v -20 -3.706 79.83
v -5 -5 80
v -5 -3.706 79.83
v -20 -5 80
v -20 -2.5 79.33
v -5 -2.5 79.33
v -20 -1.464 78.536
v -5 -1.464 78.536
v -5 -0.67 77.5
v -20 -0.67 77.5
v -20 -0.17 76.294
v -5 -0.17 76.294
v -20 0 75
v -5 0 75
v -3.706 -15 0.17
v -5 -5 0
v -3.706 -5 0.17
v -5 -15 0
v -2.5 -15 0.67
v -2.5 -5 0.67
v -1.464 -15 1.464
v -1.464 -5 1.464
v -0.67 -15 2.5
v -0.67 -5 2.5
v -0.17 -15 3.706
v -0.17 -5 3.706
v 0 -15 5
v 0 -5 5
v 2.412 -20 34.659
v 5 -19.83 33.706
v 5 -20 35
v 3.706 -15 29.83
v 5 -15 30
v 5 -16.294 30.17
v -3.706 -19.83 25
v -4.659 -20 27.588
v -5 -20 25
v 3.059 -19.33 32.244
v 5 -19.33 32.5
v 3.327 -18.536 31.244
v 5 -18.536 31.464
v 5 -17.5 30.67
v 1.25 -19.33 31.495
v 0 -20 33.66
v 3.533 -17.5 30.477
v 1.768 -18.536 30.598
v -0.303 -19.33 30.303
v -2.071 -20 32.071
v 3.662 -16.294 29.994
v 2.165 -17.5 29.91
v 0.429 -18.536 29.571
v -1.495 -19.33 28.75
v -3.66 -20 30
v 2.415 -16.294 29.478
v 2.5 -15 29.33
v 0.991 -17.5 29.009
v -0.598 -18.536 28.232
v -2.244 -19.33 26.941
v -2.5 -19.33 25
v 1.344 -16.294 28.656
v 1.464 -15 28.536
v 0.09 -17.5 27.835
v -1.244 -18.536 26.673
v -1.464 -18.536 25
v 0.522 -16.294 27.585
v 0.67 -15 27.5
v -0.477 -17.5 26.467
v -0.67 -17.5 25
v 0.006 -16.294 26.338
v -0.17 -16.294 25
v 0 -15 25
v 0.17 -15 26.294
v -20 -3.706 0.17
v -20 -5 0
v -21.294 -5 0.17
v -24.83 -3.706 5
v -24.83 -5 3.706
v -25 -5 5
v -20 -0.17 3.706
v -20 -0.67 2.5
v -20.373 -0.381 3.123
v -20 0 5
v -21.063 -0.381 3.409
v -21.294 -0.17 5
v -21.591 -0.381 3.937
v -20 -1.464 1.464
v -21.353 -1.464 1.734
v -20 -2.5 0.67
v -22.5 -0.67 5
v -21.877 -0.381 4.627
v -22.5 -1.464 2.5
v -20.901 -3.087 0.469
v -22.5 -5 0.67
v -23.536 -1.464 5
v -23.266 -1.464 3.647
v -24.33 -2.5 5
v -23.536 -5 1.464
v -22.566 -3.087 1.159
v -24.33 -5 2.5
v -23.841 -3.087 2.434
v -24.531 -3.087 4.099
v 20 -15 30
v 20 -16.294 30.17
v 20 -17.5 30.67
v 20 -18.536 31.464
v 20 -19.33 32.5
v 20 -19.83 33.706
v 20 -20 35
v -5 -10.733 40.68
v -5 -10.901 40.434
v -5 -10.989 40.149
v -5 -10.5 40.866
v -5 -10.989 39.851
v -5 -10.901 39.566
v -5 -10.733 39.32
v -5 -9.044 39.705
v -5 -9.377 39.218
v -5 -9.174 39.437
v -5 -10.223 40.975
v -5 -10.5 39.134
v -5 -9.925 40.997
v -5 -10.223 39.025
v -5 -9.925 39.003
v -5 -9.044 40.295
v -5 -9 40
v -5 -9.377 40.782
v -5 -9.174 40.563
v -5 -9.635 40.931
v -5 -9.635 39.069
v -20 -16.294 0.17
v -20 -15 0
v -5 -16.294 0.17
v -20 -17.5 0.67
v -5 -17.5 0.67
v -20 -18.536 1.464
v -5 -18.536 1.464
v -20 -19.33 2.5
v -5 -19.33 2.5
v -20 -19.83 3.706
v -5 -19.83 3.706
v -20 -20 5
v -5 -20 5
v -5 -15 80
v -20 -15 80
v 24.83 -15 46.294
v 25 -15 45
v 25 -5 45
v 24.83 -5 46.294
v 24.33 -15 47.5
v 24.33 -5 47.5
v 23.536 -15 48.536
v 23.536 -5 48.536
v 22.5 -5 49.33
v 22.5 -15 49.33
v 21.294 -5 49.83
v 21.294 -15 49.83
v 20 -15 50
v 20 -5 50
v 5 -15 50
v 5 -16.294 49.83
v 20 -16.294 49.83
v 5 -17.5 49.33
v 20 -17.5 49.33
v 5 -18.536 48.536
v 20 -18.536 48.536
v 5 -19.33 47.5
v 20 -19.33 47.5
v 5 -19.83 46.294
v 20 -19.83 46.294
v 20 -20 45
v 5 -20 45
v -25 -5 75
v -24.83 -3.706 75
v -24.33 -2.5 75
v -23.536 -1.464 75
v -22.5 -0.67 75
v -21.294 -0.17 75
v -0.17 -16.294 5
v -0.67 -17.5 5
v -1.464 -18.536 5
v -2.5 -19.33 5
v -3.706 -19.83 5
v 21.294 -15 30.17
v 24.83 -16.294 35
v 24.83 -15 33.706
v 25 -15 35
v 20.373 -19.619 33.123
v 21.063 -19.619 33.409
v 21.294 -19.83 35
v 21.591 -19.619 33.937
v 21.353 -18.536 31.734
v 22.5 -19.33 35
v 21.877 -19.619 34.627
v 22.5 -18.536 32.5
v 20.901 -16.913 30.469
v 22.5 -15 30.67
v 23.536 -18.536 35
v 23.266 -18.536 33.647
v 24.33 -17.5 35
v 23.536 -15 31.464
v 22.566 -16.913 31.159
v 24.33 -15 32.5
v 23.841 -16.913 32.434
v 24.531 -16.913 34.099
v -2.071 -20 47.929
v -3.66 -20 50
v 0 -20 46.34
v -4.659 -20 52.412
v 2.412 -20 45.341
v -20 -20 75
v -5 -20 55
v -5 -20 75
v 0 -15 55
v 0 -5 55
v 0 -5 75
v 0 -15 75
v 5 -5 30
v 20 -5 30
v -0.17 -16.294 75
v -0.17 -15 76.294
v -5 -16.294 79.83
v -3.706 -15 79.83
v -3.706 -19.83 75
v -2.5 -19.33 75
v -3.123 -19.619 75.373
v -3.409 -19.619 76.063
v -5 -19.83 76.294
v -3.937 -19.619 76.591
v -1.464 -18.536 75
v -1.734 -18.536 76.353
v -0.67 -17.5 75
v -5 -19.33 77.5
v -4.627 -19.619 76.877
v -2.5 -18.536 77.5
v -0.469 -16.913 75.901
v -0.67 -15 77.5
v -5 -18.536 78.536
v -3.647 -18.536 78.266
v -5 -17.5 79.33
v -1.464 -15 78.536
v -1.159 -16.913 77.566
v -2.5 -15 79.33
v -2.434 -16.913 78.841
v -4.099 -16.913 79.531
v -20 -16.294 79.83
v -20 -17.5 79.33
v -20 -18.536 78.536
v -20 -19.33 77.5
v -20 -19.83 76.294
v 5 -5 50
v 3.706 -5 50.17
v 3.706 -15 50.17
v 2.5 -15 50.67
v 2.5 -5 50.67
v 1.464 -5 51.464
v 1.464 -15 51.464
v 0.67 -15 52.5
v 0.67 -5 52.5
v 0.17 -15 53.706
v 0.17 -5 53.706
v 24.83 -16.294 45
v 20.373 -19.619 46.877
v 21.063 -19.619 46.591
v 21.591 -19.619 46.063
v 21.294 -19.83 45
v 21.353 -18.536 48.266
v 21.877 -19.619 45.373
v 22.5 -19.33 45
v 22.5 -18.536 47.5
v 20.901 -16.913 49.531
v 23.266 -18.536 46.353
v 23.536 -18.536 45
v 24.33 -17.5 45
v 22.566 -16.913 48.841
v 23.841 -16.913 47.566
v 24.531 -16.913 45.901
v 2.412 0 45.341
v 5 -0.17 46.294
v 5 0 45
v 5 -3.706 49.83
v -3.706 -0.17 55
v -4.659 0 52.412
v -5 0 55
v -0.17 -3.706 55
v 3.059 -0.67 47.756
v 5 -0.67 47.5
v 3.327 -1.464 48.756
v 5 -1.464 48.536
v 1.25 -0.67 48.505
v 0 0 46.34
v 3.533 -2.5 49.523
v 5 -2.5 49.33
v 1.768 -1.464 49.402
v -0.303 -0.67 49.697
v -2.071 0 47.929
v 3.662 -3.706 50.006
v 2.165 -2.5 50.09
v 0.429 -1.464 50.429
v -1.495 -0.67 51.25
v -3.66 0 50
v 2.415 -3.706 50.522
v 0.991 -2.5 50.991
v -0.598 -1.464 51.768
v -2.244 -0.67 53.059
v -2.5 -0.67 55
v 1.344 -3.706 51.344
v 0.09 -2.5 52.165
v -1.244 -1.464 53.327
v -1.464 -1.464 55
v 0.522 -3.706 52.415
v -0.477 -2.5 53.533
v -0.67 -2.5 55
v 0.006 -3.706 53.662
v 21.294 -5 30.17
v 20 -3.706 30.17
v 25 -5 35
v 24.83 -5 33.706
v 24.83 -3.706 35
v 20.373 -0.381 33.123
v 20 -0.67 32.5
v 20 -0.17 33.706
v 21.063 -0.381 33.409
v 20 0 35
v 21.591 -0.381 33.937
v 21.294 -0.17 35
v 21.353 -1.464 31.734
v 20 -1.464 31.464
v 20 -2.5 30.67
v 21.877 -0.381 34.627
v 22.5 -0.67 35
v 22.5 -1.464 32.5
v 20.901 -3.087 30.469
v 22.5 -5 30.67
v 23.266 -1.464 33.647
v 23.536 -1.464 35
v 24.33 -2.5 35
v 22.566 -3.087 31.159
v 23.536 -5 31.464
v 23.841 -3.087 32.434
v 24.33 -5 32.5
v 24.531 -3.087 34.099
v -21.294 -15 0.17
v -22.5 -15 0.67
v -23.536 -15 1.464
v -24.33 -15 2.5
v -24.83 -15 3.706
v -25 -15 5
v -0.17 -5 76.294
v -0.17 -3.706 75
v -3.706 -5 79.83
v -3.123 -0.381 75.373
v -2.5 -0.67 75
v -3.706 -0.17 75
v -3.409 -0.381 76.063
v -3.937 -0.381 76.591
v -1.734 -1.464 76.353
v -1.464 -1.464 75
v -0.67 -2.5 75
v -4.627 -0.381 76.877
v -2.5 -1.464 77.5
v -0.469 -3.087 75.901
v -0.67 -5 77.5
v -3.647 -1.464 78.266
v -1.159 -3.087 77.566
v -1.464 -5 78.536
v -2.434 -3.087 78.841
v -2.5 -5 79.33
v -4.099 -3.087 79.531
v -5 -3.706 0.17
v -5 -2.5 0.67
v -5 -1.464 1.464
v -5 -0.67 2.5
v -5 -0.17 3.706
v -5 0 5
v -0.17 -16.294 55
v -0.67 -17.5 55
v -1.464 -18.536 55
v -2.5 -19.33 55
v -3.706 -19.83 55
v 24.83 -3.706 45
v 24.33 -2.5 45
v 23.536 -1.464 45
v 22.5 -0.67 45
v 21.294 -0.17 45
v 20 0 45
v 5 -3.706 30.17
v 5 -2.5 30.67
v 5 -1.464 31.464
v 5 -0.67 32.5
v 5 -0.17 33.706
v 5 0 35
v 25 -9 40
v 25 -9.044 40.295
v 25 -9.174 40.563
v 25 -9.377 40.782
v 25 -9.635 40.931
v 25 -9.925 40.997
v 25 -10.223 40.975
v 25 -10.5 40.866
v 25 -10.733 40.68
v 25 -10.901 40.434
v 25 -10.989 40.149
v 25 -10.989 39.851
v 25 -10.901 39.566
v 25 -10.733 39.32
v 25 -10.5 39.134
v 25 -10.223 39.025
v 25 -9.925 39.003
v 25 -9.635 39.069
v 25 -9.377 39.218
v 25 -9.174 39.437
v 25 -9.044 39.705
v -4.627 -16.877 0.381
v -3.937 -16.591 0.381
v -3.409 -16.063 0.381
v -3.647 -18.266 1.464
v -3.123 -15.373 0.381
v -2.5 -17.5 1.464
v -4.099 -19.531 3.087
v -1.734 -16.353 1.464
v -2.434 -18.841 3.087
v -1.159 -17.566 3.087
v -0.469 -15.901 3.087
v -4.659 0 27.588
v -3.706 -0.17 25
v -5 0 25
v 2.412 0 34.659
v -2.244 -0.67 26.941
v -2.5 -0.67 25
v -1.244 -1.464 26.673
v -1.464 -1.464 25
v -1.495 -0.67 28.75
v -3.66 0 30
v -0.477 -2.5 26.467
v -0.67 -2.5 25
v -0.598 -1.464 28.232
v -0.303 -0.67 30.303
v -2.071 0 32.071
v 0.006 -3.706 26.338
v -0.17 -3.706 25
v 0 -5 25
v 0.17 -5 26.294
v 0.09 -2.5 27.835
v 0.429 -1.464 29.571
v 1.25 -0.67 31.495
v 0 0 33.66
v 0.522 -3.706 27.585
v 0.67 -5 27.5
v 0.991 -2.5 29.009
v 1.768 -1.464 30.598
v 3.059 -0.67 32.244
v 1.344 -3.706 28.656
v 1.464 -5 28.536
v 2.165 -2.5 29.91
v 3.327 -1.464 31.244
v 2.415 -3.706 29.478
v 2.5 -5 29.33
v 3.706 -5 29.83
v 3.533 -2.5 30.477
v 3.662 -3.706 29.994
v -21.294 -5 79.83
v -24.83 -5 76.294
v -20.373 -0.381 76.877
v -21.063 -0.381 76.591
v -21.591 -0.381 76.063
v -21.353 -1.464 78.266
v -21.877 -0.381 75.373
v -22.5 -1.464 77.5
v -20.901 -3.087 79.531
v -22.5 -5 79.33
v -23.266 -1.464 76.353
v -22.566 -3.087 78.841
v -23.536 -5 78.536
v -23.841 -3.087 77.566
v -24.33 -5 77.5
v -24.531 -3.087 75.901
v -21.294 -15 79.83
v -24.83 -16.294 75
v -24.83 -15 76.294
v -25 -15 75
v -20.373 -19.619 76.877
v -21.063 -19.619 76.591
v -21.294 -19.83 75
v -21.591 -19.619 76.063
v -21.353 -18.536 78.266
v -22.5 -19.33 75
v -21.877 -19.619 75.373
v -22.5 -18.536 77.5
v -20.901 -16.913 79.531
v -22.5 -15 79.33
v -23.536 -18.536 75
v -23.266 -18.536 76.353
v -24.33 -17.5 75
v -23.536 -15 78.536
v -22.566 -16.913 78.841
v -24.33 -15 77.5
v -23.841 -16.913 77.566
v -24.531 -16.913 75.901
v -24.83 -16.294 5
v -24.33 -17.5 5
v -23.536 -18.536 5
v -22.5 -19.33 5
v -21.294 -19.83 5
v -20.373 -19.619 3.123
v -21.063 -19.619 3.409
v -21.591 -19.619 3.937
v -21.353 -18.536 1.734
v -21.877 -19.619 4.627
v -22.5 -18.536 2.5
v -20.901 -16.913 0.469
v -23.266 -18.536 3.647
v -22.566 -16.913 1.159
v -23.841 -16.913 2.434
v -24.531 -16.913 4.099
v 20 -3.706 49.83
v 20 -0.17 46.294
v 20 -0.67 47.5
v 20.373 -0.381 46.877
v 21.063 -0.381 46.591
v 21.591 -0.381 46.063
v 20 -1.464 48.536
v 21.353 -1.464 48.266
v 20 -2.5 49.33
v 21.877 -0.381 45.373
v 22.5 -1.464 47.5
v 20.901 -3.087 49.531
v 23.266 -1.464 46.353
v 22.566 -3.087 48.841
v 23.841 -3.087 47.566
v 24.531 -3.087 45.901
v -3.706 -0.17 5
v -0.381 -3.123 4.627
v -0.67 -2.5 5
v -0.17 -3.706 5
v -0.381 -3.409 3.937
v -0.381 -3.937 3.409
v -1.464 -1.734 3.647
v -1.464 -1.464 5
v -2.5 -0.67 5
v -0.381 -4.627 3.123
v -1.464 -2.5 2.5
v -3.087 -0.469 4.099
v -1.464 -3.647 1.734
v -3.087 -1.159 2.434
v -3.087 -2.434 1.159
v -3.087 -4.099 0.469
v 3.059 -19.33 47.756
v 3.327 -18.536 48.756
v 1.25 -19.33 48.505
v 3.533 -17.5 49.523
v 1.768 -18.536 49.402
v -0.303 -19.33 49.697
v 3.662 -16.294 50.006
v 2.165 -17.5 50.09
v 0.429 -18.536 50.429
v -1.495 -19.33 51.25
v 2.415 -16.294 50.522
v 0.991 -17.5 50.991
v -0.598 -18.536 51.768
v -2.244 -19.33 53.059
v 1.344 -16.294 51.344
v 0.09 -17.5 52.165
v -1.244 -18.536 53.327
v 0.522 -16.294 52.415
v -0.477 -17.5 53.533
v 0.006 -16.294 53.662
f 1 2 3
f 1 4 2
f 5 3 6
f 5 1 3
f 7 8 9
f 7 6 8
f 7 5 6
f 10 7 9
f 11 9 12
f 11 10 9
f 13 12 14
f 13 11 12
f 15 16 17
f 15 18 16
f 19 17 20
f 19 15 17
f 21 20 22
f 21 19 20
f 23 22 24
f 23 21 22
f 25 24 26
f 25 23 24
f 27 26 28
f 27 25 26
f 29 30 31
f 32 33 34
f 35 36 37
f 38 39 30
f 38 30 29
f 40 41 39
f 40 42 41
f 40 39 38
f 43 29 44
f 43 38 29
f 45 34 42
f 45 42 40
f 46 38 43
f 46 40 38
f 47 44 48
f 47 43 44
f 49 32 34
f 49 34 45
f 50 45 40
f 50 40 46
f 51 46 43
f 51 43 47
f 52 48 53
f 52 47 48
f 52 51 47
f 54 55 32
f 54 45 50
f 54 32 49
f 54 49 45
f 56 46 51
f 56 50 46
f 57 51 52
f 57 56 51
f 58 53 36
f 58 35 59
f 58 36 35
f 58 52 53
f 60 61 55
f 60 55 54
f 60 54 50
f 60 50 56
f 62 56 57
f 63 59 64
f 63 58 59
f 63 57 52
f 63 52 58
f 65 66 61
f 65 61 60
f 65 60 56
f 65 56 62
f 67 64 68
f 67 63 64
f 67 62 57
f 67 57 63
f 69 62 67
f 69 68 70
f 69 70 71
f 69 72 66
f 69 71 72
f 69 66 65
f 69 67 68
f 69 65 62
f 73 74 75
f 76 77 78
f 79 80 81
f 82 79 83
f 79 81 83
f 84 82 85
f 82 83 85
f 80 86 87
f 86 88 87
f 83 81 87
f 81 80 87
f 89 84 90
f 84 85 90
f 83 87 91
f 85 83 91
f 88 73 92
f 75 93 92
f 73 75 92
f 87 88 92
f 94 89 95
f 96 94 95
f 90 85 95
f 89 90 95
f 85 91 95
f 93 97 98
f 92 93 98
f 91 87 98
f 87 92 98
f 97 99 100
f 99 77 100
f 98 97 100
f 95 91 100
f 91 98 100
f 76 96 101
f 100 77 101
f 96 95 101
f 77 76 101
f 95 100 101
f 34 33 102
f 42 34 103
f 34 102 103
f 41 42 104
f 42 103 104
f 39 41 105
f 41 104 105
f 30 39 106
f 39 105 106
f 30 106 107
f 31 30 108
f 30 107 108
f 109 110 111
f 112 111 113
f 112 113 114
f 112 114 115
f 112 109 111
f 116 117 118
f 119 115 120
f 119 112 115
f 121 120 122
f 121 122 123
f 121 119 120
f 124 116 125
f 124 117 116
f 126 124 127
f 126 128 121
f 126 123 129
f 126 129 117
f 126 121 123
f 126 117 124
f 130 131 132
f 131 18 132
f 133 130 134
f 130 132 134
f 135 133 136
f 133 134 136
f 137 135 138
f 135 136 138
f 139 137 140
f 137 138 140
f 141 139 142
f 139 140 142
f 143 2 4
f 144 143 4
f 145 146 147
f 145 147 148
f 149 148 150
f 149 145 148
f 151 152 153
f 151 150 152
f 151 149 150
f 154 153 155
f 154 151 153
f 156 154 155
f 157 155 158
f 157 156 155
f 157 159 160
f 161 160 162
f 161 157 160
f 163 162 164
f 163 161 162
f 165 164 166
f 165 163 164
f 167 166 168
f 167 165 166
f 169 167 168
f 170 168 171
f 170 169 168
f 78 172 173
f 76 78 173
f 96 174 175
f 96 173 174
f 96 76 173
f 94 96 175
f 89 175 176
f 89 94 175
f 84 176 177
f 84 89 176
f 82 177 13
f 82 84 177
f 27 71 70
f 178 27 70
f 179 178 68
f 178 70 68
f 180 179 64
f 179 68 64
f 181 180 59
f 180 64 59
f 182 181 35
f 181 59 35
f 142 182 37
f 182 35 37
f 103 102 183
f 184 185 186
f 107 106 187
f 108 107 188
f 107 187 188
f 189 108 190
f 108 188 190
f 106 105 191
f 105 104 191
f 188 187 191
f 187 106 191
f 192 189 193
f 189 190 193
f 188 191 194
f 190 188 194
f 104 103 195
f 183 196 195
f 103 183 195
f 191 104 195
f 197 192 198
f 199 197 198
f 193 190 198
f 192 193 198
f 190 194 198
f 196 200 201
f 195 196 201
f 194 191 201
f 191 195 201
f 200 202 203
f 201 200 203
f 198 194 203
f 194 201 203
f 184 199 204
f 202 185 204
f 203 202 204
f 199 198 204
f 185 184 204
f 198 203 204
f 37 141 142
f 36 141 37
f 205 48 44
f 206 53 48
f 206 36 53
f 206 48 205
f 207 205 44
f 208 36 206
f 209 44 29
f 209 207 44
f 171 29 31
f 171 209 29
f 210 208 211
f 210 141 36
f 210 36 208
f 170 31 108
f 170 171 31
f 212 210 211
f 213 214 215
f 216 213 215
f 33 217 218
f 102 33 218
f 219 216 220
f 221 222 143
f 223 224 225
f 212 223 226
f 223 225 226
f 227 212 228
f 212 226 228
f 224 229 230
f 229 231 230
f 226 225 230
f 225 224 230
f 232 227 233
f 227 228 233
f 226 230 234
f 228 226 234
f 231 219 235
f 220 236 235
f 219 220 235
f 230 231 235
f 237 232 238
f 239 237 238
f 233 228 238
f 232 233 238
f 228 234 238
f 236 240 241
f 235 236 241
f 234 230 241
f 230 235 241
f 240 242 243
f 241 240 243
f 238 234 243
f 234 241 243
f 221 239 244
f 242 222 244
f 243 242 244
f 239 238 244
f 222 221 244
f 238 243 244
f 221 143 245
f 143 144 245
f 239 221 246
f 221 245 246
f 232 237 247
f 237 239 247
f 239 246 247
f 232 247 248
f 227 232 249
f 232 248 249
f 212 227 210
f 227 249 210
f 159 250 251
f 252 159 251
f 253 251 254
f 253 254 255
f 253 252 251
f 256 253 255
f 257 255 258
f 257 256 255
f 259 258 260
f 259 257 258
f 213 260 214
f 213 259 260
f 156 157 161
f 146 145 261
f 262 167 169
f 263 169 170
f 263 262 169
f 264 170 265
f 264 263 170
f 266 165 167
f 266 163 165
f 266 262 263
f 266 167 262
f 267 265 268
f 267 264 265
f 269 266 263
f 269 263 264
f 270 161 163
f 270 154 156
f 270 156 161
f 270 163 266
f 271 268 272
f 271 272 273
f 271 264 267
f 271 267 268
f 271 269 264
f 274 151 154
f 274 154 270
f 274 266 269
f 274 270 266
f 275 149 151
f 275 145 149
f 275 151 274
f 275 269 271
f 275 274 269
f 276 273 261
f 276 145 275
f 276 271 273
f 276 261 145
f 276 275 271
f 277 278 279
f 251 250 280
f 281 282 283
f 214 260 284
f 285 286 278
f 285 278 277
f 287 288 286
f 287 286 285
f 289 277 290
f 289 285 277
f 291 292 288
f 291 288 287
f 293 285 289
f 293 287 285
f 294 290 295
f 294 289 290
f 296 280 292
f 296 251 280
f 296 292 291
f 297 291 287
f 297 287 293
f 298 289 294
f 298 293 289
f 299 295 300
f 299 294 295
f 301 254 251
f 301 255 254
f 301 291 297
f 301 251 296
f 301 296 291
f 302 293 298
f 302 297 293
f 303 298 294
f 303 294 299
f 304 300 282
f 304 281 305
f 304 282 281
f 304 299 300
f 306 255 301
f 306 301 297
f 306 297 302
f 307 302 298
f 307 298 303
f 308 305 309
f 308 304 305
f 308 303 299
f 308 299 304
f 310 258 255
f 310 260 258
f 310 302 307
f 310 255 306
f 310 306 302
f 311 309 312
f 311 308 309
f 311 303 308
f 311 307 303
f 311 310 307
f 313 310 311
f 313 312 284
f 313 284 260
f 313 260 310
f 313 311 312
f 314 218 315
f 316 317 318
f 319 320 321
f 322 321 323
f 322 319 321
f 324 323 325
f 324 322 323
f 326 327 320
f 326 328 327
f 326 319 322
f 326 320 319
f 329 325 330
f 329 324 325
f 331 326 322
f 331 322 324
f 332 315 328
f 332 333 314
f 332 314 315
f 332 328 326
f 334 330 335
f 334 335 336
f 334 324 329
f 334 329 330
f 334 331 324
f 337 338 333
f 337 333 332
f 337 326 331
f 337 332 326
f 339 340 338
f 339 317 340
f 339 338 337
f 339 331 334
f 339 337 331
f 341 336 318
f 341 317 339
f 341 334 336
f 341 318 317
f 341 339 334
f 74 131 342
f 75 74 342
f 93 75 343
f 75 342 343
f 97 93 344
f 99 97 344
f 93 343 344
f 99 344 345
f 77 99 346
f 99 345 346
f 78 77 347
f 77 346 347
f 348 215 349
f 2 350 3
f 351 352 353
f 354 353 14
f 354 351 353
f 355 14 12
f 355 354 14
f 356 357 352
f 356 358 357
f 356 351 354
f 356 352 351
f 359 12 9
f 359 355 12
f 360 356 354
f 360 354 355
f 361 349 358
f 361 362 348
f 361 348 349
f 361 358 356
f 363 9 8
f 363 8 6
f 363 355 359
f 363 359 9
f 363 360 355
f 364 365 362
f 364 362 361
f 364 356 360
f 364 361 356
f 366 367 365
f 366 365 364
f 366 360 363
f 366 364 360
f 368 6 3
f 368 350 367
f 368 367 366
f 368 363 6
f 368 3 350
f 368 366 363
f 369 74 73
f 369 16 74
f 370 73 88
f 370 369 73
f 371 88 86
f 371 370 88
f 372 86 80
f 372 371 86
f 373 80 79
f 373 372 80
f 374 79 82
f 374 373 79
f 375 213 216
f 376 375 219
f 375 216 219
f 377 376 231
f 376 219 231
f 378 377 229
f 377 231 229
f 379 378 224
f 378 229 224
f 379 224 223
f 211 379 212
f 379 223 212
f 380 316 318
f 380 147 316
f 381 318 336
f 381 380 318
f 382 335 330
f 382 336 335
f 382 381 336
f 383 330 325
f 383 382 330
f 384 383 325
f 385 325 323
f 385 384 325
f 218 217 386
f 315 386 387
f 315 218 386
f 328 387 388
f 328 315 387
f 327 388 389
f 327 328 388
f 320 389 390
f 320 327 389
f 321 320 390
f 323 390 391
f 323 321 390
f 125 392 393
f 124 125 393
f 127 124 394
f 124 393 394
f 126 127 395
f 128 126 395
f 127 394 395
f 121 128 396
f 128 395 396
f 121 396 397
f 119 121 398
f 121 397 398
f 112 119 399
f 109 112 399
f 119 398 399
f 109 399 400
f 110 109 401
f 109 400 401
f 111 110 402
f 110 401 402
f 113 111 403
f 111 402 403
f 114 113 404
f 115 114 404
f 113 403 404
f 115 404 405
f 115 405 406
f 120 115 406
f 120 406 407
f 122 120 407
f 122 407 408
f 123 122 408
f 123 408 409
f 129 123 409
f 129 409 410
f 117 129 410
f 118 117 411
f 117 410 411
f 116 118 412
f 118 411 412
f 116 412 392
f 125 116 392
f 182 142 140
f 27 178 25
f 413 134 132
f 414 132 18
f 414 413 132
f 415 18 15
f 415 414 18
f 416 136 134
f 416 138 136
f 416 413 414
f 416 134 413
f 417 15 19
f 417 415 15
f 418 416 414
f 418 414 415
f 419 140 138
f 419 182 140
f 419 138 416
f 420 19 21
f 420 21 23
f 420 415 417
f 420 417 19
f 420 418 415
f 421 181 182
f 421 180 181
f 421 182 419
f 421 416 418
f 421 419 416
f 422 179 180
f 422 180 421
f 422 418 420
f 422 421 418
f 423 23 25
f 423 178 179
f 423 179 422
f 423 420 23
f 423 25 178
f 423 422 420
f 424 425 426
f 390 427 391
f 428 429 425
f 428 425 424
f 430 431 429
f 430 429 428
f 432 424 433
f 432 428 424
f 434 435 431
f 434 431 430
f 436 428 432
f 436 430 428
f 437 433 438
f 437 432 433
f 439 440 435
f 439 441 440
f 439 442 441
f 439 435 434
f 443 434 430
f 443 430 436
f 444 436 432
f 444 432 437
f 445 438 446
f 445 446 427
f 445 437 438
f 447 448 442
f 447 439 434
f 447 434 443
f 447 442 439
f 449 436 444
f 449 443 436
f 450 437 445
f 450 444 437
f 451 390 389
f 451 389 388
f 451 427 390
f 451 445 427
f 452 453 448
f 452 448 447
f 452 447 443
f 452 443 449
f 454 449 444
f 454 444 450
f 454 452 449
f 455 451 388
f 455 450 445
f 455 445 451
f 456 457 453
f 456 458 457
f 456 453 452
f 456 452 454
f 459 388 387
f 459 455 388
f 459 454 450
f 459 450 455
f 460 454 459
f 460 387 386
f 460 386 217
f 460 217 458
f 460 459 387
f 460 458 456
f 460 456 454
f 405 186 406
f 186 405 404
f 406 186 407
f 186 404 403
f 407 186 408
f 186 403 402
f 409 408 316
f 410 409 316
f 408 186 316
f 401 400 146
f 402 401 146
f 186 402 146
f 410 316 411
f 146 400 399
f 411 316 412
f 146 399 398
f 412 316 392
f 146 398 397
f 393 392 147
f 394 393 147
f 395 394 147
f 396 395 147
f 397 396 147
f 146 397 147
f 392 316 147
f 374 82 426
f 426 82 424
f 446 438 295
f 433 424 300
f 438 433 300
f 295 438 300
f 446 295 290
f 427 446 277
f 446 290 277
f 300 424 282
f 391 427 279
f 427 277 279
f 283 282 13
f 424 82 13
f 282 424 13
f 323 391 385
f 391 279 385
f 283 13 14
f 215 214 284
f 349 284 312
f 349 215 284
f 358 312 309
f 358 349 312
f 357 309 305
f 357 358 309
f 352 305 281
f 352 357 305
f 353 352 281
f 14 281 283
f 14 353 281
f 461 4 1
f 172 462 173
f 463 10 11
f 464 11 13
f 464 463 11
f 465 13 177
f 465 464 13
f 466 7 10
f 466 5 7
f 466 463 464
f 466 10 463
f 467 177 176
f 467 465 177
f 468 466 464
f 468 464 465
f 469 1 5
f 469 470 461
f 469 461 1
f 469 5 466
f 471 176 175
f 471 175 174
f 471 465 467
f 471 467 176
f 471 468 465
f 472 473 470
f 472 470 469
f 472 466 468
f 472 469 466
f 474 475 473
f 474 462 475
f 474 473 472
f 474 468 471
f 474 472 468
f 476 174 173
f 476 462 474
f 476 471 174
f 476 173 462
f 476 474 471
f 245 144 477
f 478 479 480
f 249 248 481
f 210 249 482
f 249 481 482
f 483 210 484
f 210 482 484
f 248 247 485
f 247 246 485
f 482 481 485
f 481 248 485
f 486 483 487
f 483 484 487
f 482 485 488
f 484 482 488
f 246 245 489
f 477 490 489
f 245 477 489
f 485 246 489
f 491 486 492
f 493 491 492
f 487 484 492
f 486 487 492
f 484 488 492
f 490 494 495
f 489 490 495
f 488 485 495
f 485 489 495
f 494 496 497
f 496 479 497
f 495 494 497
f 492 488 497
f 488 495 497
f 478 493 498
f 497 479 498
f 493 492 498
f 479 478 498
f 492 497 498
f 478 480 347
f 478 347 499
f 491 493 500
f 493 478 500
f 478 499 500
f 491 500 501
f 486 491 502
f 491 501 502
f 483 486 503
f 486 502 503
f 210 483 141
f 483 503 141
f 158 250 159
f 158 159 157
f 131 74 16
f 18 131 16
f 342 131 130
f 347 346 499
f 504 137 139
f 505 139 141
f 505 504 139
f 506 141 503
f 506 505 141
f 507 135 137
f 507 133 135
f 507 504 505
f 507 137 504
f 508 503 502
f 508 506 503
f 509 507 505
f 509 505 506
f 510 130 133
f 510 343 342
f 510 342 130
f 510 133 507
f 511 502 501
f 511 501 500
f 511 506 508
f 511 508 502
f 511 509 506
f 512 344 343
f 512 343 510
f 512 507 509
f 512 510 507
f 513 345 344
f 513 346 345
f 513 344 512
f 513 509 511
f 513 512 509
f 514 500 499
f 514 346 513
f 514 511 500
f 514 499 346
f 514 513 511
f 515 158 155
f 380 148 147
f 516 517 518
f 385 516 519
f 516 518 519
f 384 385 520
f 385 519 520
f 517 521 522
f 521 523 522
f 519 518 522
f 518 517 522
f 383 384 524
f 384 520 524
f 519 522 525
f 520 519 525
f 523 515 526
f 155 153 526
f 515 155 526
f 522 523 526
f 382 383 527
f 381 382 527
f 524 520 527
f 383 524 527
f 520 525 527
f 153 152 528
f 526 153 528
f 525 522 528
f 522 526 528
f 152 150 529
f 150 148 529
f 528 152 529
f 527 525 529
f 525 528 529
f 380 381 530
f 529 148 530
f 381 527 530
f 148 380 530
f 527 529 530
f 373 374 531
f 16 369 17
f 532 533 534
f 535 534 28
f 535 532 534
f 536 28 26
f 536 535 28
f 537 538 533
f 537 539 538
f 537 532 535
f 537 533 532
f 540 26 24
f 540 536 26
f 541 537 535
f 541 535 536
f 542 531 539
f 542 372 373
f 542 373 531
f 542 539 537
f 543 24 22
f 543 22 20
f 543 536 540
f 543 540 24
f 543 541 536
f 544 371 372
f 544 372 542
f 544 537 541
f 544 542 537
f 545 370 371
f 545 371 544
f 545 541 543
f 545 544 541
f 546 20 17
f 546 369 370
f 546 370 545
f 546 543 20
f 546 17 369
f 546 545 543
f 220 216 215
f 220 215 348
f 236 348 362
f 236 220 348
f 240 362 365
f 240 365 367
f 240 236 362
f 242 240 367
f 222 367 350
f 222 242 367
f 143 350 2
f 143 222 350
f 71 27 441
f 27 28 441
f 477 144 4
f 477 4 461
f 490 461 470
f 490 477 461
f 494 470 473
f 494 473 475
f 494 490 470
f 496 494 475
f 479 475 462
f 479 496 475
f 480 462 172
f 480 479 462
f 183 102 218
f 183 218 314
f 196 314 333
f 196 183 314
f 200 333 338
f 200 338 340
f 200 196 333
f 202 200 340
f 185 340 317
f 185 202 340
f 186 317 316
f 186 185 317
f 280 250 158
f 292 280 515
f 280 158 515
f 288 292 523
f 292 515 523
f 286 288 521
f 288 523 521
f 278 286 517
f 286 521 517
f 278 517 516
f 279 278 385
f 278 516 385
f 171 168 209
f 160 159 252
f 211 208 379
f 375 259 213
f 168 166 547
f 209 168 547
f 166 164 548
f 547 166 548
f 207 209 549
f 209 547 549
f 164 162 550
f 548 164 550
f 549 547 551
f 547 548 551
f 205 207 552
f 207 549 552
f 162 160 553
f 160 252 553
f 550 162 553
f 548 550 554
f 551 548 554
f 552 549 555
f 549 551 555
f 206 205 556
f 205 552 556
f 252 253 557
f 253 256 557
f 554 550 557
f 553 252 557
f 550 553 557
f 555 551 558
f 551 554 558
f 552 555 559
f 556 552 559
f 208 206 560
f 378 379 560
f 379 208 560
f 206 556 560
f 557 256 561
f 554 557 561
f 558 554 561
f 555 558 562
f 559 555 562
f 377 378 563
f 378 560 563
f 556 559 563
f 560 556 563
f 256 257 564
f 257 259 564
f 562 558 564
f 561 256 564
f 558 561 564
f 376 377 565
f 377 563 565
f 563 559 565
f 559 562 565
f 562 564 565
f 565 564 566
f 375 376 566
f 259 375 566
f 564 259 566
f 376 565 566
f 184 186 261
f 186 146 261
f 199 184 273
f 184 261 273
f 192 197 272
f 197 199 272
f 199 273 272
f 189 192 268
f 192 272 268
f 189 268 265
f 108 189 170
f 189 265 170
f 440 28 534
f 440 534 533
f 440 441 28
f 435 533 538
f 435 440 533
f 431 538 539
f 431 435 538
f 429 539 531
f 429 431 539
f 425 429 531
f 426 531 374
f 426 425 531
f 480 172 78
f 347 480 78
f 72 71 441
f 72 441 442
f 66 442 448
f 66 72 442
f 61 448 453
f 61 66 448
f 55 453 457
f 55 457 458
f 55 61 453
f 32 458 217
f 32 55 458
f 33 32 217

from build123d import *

# Parameters (mm, degrees)
F0_W     = 25
F0_H     = 20
F1_DEPTH = 20
F2_R     = 5
F3_R     = 1
F4_DEPTH = 30


with BuildPart() as f1:
    # F0 (on Front) → F1 (new body)
    with BuildSketch(Plane.XZ):
        Polygon((-25, 0), (0, 0), (0, 30), (0, 50), (0, 80), (-25, 80), align=None)
        with Locations((12.5, 40)):
            Rectangle(F0_W, F0_H)
    extrude(amount=F1_DEPTH)

    # F2
    f2_edges = [f1.edges().sort_by_distance(p)[0] for p in [
        (0, -20, 15),
        (25, -10, 30),
        (0, -10, 30),
        (-25, -10, 80),
        (0, -10, 80),
        (-25, -10, 0),
        (0, -20, 65),
        (0, 0, 65),
        (0, -10, 50),
        (25, -10, 50),
        (-12.5, 0, 0),
        (-12.5, -20, 0),
        (-12.5, 0, 80),
        (-12.5, -20, 80),
        (0, 0, 15),
        (-25, 0, 40),
        (-25, -20, 40),
        (12.5, 0, 30),
        (12.5, -20, 30),
        (12.5, 0, 50),
        (12.5, -20, 50),
        (0, -10, 0),
        (25, 0, 40),
        (25, -20, 40),
    ]]
    fillet(f2_edges, radius=F2_R)

    # F3 (on face) → F4 (cut)
    with BuildSketch(Plane.YZ.offset(25)):
        with Locations((-10, 40)):
            Circle(F3_R)
    extrude(amount=-F4_DEPTH, mode=Mode.SUBTRACT)


solid = f1.part
